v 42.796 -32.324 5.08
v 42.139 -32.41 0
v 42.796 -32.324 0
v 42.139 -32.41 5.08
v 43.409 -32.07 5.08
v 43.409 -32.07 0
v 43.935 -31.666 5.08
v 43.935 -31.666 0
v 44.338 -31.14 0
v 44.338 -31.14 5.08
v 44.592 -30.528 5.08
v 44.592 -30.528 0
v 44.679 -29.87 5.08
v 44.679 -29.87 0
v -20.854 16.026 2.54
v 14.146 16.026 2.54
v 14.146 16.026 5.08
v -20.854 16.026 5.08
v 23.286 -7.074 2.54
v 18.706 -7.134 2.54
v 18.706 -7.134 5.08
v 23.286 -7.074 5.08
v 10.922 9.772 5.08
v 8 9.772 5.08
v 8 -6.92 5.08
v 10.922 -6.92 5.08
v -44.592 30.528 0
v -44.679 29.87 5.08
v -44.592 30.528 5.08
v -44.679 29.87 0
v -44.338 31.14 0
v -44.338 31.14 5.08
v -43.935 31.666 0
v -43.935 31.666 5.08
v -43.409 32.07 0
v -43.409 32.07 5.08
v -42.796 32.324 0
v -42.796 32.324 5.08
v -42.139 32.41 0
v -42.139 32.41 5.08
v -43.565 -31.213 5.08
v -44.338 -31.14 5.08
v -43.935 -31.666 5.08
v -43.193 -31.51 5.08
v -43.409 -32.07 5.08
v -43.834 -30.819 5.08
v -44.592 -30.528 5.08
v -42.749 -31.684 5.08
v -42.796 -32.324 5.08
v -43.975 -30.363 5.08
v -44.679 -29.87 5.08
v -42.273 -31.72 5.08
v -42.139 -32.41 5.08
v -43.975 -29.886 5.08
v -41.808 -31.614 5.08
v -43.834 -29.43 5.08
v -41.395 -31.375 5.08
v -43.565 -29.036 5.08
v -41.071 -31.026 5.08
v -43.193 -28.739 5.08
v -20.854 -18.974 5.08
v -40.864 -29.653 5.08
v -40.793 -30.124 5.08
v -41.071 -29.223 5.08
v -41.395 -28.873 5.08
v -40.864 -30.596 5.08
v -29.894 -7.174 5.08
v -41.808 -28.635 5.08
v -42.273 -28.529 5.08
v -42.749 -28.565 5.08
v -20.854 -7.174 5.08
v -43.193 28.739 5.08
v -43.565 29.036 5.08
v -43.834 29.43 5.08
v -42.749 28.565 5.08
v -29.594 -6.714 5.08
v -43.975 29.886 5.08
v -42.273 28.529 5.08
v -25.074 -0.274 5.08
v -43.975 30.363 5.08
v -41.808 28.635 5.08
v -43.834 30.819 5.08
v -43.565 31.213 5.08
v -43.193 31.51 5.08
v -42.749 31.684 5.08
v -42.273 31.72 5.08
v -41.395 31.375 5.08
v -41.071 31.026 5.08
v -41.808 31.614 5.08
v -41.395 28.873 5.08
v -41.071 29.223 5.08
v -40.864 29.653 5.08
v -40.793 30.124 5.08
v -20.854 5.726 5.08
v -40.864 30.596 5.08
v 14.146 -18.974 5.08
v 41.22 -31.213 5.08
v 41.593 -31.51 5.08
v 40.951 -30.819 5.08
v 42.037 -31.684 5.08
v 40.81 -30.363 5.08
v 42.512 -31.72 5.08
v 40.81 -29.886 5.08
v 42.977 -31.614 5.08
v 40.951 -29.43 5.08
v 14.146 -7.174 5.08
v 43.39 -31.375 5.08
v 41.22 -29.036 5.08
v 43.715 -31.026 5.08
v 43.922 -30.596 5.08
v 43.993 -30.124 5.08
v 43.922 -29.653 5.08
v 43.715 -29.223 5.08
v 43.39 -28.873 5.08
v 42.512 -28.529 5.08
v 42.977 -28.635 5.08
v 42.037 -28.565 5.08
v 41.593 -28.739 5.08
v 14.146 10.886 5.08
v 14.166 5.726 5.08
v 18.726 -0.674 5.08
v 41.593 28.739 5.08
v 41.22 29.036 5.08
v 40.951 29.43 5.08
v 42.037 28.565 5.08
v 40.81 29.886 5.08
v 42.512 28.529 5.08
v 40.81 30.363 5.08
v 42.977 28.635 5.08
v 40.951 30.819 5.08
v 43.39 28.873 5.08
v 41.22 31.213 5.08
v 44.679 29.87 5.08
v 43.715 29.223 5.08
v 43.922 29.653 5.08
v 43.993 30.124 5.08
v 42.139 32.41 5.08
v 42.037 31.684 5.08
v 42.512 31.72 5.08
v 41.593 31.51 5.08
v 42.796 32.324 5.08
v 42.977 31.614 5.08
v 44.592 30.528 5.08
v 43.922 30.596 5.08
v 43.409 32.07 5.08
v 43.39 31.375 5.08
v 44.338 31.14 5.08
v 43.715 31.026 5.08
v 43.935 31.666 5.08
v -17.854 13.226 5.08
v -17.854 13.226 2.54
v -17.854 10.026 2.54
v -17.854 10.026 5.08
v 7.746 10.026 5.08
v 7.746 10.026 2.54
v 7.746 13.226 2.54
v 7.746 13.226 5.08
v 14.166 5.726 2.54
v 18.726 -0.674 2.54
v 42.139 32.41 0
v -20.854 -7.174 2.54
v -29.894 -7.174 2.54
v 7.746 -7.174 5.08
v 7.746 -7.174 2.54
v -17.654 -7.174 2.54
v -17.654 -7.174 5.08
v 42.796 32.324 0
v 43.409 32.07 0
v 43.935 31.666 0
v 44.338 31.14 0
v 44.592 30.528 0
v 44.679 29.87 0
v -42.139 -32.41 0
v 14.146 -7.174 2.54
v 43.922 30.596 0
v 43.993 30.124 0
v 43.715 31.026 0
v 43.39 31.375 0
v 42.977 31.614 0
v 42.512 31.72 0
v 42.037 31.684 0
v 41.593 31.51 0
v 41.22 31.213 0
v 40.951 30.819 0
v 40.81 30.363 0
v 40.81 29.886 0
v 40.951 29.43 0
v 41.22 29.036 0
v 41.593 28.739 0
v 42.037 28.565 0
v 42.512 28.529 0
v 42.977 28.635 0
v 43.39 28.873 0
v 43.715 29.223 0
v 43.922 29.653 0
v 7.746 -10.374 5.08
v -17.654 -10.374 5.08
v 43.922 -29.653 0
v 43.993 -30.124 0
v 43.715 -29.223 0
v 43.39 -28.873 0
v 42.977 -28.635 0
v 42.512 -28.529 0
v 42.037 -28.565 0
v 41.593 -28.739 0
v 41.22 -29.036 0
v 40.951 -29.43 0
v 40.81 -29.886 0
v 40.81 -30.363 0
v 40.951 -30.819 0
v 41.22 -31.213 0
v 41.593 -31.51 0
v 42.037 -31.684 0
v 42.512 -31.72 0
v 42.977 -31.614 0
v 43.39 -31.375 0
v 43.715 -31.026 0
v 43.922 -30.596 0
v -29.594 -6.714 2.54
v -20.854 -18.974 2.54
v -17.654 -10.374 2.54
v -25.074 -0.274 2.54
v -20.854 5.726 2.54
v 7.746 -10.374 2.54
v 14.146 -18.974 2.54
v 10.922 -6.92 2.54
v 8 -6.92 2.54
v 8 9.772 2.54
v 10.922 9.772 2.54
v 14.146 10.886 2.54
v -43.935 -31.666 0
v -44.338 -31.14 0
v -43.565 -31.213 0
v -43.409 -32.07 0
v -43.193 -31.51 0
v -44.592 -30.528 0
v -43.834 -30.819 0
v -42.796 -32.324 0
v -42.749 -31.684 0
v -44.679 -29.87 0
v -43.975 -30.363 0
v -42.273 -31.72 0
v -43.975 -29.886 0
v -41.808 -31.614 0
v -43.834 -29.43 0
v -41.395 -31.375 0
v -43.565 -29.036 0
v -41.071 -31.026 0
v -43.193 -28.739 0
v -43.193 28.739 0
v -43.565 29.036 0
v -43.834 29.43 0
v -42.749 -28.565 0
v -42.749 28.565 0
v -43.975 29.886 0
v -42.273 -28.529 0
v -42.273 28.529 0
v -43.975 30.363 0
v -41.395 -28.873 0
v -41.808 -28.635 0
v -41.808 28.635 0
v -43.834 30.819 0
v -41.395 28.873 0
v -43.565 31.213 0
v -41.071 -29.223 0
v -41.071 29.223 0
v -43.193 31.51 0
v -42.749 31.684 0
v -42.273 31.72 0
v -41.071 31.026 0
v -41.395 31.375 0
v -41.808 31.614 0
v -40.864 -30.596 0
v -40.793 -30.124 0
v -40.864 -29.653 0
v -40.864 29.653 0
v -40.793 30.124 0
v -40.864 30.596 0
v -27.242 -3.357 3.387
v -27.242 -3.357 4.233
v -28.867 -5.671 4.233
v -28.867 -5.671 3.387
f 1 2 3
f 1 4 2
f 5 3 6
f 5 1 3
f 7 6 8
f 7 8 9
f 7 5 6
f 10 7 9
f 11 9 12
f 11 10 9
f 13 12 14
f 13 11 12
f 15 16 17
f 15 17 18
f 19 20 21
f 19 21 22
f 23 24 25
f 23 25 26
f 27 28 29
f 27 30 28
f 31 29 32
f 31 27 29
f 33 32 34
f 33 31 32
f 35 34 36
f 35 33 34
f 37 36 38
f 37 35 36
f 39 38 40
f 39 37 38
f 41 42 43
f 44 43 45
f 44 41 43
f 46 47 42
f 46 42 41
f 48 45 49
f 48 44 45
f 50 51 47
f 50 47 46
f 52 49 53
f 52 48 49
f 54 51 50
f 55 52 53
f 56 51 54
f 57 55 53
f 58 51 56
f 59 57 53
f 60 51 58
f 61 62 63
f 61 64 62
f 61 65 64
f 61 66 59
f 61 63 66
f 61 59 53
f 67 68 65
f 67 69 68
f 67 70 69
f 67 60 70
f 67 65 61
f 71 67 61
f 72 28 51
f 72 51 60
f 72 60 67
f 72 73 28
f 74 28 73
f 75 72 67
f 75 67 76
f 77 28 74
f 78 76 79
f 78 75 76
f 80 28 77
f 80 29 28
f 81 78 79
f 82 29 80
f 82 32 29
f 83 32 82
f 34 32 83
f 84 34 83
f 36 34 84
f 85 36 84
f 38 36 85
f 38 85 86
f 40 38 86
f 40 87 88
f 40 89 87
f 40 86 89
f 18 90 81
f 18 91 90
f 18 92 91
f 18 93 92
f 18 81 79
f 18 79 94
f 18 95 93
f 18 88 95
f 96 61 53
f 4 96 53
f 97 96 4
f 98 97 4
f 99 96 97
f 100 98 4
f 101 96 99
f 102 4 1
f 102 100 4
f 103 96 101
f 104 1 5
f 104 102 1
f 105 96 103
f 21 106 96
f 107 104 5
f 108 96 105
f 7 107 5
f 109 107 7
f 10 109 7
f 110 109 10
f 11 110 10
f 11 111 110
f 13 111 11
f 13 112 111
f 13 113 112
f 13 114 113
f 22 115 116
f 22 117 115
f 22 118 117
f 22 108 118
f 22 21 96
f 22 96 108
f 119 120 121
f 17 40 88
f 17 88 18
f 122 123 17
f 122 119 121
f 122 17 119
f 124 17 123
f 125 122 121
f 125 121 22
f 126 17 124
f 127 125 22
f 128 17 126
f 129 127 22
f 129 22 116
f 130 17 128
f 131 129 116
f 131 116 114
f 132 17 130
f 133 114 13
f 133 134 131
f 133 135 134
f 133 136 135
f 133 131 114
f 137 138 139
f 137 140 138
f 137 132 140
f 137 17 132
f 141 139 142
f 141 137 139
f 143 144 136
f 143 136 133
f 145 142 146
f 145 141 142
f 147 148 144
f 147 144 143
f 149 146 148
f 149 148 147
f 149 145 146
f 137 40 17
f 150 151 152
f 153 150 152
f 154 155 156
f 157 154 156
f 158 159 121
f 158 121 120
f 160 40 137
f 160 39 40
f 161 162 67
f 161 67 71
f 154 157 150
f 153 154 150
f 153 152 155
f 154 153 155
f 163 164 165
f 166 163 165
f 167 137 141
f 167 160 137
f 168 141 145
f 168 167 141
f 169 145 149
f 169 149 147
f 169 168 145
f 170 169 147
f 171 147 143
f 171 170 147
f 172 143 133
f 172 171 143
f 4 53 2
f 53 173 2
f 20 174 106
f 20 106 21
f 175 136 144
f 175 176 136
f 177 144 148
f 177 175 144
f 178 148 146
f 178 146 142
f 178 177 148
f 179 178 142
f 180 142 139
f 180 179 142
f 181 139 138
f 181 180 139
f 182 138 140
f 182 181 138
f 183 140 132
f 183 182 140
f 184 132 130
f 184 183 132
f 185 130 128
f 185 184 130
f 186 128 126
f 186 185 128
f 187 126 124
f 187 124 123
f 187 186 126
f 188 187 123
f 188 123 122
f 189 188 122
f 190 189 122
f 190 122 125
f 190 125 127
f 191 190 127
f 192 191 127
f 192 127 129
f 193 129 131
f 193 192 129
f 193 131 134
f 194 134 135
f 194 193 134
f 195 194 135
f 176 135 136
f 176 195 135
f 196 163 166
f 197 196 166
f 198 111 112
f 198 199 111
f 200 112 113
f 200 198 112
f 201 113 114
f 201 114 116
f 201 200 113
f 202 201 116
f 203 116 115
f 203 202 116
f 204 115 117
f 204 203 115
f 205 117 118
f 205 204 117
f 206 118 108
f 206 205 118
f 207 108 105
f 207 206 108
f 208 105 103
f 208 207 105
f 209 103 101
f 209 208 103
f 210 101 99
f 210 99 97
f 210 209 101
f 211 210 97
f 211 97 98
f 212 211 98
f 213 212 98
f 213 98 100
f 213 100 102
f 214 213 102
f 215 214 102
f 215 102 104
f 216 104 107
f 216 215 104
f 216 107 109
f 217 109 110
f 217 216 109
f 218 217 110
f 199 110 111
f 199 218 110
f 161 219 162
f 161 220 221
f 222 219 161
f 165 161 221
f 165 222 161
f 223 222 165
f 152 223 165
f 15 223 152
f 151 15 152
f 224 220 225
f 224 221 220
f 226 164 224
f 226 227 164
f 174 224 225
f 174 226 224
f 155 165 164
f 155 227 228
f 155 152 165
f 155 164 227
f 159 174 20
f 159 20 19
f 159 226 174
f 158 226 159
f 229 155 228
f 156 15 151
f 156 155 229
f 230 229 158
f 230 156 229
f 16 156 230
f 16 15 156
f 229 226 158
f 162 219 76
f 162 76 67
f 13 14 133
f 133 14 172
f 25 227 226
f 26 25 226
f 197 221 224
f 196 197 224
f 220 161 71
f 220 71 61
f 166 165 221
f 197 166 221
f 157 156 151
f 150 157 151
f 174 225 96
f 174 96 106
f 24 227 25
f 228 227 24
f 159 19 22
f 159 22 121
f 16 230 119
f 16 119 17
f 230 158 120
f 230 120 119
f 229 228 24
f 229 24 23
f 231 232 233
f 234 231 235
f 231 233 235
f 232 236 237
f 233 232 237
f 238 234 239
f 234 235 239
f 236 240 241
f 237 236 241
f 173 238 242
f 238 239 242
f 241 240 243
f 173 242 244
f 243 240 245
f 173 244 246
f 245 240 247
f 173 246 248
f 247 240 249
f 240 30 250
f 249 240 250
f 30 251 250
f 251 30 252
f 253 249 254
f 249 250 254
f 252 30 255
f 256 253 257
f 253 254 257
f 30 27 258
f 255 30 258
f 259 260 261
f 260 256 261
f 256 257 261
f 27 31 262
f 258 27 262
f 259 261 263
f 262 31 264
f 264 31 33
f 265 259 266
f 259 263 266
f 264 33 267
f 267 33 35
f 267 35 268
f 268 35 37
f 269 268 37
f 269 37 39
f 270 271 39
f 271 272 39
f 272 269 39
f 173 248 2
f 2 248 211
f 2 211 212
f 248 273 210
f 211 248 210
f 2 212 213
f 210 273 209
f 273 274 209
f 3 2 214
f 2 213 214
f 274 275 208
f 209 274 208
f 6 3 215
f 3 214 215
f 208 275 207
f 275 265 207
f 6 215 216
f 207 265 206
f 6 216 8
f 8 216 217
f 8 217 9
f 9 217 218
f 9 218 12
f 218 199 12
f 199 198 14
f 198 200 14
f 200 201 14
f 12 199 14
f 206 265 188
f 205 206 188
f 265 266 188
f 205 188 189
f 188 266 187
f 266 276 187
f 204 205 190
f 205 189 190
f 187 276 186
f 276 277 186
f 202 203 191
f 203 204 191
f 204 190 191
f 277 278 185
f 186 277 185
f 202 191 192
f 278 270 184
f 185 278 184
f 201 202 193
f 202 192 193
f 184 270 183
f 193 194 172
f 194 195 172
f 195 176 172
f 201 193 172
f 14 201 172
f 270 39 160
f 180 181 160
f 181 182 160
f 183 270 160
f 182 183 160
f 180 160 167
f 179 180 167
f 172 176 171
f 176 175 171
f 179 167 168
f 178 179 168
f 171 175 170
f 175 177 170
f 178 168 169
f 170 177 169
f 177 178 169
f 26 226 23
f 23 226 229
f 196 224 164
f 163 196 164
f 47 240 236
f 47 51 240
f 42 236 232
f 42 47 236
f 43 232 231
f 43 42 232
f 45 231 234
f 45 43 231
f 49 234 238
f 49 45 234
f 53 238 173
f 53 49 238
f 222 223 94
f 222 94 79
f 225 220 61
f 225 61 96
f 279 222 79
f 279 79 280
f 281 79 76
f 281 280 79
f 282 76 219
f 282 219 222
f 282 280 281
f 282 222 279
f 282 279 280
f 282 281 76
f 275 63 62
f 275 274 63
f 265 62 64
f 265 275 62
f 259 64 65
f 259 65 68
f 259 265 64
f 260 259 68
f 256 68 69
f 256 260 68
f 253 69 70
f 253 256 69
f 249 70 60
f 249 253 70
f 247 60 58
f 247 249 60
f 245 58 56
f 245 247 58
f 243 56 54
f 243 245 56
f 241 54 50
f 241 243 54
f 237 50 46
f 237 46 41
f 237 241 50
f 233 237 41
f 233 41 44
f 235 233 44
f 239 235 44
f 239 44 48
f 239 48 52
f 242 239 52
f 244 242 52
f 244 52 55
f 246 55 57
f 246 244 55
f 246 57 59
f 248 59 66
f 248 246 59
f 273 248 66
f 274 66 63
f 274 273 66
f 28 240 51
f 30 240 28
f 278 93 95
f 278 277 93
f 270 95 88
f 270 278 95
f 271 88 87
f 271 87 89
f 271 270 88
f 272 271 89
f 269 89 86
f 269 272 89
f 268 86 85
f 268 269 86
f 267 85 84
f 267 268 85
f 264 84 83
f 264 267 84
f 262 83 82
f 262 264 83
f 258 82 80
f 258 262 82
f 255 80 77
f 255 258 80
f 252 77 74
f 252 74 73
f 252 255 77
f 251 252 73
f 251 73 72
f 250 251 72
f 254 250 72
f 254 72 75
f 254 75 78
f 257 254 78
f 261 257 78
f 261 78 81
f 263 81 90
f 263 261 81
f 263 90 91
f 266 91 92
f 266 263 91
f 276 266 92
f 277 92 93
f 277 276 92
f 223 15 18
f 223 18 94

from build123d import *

# Parameters (mm, degrees)
SKETCH1_W            = 89.3572
SKETCH1_H            = 64.8208
SKETCH1_R            = 1.6
BOSS_EXTRUDE1_DEPTH  = 2.54
SKETCH2_W            = 89.3572
SKETCH2_H            = 64.8208
SKETCH2_R            = 1.6
SKETCH2_W_2          = 25.6
SKETCH2_H_2          = 3.2
SKETCH2_W_3          = 25.4
BOSS_EXTRUDE11_DEPTH = 2.54
SKETCH3_W            = 2.92236531
SKETCH3_H            = 16.692
BOSS_EXTRUDE13_DEPTH = 2.54
FILLET1_R            = 2.54


with BuildPart() as part:
    # Sketch1 → Boss-Extrude1 (new body)
    with BuildSketch(Plane.XY):
        Rectangle(SKETCH1_W, SKETCH1_H)
        with Locations((-42.3926, 30.1244)):
            Circle(SKETCH1_R, mode=Mode.SUBTRACT)
        with Locations((-42.3926, -30.1244)):
            Circle(SKETCH1_R, mode=Mode.SUBTRACT)
        with Locations((42.3926, -30.1244)):
            Circle(SKETCH1_R, mode=Mode.SUBTRACT)
        with Locations((42.3926, 30.1244)):
            Circle(SKETCH1_R, mode=Mode.SUBTRACT)
    extrude(amount=BOSS_EXTRUDE1_DEPTH)

    # Sketch2 → Boss-Extrude11 (add)
    # profile 1 of 3: a face of its own
    with BuildSketch(Plane.XY.offset(2.54)):
        Rectangle(SKETCH2_W, SKETCH2_H)
        with Locations((-42.3926, -30.1244)):
            Circle(SKETCH2_R, mode=Mode.SUBTRACT)
        with BuildLine():
            Line((-20.85424435, -7.173869479), (-29.894283412, -7.173869479))
            Line((-29.894283412, -7.173869479), (-29.594283412, -6.713908542))
            add(Edge.make_bspline(
                [(-25.074263881, -0.273869479), (-27.394283412, -3.573869479), (-29.434224819, -6.473869479), (-29.594283412, -6.713908542)],
                knots=[18, 18, 18, 18, 19, 19, 19, 19], degree=3))
            Line((-25.074263881, -0.273869479), (-20.85424435, 5.726130521))
            Line((-20.85424435, 5.726130521), (-20.85424435, 16.026130521))
            Line((-20.85424435, 16.026130521), (14.14575565, 16.026130521))
            Line((14.14575565, 16.026130521), (14.14575565, 10.886091458))
            Line((14.14575565, 10.886091458), (14.165677525, 5.726130521))
            Line((14.165677525, 5.726130521), (18.725833775, -0.673869479))
            Line((18.725833775, -0.673869479), (23.285794713, -7.073869479))
            Line((23.285794713, -7.073869479), (18.705716588, -7.133830417))
            Line((18.705716588, -7.133830417), (14.14575565, -7.173869479))
            Line((14.14575565, -7.173869479), (14.14575565, -18.973869479))
            Line((14.14575565, -18.973869479), (-20.85424435, -18.973869479))
            Line((-20.85424435, -18.973869479), (-20.85424435, -7.173869479))
        make_face(mode=Mode.SUBTRACT)
        with Locations((42.3926, -30.1244)):
            Circle(SKETCH2_R, mode=Mode.SUBTRACT)
        with Locations((-42.3926, 30.1244)):
            Circle(SKETCH2_R, mode=Mode.SUBTRACT)
        with Locations((42.3926, 30.1244)):
            Circle(SKETCH2_R, mode=Mode.SUBTRACT)
    # profile 2 of 3: a face of its own
    with BuildSketch(Plane.XY.offset(2.54)):
        with Locations((-5.05424435, 11.626130521)):
            Rectangle(SKETCH2_W_2, SKETCH2_H_2)
    # profile 3 of 3: a face of its own
    with BuildSketch(Plane.XY.offset(2.54)):
        with Locations((-4.95424435, -8.773869479)):
            Rectangle(SKETCH2_W_3, SKETCH2_H_2)
    extrude(amount=BOSS_EXTRUDE11_DEPTH)

    # Sketch3 → Boss-Extrude13 (add)
    with BuildSketch(Plane.XY.offset(2.54)):
        with Locations((9.460938305, 1.426130521)):
            Rectangle(SKETCH3_W, SKETCH3_H)
    extrude(amount=BOSS_EXTRUDE13_DEPTH)

    # Fillet1
    fillet1_edges = [part.edges().sort_by_distance(p)[0] for p in [
        (-44.6786, -32.4104, 2.54),
        (-44.6786, 32.4104, 2.54),
        (44.6786, 32.4104, 2.54),
        (44.6786, -32.4104, 2.54),
    ]]
    fillet(fillet1_edges, radius=FILLET1_R)


solid = part.part
